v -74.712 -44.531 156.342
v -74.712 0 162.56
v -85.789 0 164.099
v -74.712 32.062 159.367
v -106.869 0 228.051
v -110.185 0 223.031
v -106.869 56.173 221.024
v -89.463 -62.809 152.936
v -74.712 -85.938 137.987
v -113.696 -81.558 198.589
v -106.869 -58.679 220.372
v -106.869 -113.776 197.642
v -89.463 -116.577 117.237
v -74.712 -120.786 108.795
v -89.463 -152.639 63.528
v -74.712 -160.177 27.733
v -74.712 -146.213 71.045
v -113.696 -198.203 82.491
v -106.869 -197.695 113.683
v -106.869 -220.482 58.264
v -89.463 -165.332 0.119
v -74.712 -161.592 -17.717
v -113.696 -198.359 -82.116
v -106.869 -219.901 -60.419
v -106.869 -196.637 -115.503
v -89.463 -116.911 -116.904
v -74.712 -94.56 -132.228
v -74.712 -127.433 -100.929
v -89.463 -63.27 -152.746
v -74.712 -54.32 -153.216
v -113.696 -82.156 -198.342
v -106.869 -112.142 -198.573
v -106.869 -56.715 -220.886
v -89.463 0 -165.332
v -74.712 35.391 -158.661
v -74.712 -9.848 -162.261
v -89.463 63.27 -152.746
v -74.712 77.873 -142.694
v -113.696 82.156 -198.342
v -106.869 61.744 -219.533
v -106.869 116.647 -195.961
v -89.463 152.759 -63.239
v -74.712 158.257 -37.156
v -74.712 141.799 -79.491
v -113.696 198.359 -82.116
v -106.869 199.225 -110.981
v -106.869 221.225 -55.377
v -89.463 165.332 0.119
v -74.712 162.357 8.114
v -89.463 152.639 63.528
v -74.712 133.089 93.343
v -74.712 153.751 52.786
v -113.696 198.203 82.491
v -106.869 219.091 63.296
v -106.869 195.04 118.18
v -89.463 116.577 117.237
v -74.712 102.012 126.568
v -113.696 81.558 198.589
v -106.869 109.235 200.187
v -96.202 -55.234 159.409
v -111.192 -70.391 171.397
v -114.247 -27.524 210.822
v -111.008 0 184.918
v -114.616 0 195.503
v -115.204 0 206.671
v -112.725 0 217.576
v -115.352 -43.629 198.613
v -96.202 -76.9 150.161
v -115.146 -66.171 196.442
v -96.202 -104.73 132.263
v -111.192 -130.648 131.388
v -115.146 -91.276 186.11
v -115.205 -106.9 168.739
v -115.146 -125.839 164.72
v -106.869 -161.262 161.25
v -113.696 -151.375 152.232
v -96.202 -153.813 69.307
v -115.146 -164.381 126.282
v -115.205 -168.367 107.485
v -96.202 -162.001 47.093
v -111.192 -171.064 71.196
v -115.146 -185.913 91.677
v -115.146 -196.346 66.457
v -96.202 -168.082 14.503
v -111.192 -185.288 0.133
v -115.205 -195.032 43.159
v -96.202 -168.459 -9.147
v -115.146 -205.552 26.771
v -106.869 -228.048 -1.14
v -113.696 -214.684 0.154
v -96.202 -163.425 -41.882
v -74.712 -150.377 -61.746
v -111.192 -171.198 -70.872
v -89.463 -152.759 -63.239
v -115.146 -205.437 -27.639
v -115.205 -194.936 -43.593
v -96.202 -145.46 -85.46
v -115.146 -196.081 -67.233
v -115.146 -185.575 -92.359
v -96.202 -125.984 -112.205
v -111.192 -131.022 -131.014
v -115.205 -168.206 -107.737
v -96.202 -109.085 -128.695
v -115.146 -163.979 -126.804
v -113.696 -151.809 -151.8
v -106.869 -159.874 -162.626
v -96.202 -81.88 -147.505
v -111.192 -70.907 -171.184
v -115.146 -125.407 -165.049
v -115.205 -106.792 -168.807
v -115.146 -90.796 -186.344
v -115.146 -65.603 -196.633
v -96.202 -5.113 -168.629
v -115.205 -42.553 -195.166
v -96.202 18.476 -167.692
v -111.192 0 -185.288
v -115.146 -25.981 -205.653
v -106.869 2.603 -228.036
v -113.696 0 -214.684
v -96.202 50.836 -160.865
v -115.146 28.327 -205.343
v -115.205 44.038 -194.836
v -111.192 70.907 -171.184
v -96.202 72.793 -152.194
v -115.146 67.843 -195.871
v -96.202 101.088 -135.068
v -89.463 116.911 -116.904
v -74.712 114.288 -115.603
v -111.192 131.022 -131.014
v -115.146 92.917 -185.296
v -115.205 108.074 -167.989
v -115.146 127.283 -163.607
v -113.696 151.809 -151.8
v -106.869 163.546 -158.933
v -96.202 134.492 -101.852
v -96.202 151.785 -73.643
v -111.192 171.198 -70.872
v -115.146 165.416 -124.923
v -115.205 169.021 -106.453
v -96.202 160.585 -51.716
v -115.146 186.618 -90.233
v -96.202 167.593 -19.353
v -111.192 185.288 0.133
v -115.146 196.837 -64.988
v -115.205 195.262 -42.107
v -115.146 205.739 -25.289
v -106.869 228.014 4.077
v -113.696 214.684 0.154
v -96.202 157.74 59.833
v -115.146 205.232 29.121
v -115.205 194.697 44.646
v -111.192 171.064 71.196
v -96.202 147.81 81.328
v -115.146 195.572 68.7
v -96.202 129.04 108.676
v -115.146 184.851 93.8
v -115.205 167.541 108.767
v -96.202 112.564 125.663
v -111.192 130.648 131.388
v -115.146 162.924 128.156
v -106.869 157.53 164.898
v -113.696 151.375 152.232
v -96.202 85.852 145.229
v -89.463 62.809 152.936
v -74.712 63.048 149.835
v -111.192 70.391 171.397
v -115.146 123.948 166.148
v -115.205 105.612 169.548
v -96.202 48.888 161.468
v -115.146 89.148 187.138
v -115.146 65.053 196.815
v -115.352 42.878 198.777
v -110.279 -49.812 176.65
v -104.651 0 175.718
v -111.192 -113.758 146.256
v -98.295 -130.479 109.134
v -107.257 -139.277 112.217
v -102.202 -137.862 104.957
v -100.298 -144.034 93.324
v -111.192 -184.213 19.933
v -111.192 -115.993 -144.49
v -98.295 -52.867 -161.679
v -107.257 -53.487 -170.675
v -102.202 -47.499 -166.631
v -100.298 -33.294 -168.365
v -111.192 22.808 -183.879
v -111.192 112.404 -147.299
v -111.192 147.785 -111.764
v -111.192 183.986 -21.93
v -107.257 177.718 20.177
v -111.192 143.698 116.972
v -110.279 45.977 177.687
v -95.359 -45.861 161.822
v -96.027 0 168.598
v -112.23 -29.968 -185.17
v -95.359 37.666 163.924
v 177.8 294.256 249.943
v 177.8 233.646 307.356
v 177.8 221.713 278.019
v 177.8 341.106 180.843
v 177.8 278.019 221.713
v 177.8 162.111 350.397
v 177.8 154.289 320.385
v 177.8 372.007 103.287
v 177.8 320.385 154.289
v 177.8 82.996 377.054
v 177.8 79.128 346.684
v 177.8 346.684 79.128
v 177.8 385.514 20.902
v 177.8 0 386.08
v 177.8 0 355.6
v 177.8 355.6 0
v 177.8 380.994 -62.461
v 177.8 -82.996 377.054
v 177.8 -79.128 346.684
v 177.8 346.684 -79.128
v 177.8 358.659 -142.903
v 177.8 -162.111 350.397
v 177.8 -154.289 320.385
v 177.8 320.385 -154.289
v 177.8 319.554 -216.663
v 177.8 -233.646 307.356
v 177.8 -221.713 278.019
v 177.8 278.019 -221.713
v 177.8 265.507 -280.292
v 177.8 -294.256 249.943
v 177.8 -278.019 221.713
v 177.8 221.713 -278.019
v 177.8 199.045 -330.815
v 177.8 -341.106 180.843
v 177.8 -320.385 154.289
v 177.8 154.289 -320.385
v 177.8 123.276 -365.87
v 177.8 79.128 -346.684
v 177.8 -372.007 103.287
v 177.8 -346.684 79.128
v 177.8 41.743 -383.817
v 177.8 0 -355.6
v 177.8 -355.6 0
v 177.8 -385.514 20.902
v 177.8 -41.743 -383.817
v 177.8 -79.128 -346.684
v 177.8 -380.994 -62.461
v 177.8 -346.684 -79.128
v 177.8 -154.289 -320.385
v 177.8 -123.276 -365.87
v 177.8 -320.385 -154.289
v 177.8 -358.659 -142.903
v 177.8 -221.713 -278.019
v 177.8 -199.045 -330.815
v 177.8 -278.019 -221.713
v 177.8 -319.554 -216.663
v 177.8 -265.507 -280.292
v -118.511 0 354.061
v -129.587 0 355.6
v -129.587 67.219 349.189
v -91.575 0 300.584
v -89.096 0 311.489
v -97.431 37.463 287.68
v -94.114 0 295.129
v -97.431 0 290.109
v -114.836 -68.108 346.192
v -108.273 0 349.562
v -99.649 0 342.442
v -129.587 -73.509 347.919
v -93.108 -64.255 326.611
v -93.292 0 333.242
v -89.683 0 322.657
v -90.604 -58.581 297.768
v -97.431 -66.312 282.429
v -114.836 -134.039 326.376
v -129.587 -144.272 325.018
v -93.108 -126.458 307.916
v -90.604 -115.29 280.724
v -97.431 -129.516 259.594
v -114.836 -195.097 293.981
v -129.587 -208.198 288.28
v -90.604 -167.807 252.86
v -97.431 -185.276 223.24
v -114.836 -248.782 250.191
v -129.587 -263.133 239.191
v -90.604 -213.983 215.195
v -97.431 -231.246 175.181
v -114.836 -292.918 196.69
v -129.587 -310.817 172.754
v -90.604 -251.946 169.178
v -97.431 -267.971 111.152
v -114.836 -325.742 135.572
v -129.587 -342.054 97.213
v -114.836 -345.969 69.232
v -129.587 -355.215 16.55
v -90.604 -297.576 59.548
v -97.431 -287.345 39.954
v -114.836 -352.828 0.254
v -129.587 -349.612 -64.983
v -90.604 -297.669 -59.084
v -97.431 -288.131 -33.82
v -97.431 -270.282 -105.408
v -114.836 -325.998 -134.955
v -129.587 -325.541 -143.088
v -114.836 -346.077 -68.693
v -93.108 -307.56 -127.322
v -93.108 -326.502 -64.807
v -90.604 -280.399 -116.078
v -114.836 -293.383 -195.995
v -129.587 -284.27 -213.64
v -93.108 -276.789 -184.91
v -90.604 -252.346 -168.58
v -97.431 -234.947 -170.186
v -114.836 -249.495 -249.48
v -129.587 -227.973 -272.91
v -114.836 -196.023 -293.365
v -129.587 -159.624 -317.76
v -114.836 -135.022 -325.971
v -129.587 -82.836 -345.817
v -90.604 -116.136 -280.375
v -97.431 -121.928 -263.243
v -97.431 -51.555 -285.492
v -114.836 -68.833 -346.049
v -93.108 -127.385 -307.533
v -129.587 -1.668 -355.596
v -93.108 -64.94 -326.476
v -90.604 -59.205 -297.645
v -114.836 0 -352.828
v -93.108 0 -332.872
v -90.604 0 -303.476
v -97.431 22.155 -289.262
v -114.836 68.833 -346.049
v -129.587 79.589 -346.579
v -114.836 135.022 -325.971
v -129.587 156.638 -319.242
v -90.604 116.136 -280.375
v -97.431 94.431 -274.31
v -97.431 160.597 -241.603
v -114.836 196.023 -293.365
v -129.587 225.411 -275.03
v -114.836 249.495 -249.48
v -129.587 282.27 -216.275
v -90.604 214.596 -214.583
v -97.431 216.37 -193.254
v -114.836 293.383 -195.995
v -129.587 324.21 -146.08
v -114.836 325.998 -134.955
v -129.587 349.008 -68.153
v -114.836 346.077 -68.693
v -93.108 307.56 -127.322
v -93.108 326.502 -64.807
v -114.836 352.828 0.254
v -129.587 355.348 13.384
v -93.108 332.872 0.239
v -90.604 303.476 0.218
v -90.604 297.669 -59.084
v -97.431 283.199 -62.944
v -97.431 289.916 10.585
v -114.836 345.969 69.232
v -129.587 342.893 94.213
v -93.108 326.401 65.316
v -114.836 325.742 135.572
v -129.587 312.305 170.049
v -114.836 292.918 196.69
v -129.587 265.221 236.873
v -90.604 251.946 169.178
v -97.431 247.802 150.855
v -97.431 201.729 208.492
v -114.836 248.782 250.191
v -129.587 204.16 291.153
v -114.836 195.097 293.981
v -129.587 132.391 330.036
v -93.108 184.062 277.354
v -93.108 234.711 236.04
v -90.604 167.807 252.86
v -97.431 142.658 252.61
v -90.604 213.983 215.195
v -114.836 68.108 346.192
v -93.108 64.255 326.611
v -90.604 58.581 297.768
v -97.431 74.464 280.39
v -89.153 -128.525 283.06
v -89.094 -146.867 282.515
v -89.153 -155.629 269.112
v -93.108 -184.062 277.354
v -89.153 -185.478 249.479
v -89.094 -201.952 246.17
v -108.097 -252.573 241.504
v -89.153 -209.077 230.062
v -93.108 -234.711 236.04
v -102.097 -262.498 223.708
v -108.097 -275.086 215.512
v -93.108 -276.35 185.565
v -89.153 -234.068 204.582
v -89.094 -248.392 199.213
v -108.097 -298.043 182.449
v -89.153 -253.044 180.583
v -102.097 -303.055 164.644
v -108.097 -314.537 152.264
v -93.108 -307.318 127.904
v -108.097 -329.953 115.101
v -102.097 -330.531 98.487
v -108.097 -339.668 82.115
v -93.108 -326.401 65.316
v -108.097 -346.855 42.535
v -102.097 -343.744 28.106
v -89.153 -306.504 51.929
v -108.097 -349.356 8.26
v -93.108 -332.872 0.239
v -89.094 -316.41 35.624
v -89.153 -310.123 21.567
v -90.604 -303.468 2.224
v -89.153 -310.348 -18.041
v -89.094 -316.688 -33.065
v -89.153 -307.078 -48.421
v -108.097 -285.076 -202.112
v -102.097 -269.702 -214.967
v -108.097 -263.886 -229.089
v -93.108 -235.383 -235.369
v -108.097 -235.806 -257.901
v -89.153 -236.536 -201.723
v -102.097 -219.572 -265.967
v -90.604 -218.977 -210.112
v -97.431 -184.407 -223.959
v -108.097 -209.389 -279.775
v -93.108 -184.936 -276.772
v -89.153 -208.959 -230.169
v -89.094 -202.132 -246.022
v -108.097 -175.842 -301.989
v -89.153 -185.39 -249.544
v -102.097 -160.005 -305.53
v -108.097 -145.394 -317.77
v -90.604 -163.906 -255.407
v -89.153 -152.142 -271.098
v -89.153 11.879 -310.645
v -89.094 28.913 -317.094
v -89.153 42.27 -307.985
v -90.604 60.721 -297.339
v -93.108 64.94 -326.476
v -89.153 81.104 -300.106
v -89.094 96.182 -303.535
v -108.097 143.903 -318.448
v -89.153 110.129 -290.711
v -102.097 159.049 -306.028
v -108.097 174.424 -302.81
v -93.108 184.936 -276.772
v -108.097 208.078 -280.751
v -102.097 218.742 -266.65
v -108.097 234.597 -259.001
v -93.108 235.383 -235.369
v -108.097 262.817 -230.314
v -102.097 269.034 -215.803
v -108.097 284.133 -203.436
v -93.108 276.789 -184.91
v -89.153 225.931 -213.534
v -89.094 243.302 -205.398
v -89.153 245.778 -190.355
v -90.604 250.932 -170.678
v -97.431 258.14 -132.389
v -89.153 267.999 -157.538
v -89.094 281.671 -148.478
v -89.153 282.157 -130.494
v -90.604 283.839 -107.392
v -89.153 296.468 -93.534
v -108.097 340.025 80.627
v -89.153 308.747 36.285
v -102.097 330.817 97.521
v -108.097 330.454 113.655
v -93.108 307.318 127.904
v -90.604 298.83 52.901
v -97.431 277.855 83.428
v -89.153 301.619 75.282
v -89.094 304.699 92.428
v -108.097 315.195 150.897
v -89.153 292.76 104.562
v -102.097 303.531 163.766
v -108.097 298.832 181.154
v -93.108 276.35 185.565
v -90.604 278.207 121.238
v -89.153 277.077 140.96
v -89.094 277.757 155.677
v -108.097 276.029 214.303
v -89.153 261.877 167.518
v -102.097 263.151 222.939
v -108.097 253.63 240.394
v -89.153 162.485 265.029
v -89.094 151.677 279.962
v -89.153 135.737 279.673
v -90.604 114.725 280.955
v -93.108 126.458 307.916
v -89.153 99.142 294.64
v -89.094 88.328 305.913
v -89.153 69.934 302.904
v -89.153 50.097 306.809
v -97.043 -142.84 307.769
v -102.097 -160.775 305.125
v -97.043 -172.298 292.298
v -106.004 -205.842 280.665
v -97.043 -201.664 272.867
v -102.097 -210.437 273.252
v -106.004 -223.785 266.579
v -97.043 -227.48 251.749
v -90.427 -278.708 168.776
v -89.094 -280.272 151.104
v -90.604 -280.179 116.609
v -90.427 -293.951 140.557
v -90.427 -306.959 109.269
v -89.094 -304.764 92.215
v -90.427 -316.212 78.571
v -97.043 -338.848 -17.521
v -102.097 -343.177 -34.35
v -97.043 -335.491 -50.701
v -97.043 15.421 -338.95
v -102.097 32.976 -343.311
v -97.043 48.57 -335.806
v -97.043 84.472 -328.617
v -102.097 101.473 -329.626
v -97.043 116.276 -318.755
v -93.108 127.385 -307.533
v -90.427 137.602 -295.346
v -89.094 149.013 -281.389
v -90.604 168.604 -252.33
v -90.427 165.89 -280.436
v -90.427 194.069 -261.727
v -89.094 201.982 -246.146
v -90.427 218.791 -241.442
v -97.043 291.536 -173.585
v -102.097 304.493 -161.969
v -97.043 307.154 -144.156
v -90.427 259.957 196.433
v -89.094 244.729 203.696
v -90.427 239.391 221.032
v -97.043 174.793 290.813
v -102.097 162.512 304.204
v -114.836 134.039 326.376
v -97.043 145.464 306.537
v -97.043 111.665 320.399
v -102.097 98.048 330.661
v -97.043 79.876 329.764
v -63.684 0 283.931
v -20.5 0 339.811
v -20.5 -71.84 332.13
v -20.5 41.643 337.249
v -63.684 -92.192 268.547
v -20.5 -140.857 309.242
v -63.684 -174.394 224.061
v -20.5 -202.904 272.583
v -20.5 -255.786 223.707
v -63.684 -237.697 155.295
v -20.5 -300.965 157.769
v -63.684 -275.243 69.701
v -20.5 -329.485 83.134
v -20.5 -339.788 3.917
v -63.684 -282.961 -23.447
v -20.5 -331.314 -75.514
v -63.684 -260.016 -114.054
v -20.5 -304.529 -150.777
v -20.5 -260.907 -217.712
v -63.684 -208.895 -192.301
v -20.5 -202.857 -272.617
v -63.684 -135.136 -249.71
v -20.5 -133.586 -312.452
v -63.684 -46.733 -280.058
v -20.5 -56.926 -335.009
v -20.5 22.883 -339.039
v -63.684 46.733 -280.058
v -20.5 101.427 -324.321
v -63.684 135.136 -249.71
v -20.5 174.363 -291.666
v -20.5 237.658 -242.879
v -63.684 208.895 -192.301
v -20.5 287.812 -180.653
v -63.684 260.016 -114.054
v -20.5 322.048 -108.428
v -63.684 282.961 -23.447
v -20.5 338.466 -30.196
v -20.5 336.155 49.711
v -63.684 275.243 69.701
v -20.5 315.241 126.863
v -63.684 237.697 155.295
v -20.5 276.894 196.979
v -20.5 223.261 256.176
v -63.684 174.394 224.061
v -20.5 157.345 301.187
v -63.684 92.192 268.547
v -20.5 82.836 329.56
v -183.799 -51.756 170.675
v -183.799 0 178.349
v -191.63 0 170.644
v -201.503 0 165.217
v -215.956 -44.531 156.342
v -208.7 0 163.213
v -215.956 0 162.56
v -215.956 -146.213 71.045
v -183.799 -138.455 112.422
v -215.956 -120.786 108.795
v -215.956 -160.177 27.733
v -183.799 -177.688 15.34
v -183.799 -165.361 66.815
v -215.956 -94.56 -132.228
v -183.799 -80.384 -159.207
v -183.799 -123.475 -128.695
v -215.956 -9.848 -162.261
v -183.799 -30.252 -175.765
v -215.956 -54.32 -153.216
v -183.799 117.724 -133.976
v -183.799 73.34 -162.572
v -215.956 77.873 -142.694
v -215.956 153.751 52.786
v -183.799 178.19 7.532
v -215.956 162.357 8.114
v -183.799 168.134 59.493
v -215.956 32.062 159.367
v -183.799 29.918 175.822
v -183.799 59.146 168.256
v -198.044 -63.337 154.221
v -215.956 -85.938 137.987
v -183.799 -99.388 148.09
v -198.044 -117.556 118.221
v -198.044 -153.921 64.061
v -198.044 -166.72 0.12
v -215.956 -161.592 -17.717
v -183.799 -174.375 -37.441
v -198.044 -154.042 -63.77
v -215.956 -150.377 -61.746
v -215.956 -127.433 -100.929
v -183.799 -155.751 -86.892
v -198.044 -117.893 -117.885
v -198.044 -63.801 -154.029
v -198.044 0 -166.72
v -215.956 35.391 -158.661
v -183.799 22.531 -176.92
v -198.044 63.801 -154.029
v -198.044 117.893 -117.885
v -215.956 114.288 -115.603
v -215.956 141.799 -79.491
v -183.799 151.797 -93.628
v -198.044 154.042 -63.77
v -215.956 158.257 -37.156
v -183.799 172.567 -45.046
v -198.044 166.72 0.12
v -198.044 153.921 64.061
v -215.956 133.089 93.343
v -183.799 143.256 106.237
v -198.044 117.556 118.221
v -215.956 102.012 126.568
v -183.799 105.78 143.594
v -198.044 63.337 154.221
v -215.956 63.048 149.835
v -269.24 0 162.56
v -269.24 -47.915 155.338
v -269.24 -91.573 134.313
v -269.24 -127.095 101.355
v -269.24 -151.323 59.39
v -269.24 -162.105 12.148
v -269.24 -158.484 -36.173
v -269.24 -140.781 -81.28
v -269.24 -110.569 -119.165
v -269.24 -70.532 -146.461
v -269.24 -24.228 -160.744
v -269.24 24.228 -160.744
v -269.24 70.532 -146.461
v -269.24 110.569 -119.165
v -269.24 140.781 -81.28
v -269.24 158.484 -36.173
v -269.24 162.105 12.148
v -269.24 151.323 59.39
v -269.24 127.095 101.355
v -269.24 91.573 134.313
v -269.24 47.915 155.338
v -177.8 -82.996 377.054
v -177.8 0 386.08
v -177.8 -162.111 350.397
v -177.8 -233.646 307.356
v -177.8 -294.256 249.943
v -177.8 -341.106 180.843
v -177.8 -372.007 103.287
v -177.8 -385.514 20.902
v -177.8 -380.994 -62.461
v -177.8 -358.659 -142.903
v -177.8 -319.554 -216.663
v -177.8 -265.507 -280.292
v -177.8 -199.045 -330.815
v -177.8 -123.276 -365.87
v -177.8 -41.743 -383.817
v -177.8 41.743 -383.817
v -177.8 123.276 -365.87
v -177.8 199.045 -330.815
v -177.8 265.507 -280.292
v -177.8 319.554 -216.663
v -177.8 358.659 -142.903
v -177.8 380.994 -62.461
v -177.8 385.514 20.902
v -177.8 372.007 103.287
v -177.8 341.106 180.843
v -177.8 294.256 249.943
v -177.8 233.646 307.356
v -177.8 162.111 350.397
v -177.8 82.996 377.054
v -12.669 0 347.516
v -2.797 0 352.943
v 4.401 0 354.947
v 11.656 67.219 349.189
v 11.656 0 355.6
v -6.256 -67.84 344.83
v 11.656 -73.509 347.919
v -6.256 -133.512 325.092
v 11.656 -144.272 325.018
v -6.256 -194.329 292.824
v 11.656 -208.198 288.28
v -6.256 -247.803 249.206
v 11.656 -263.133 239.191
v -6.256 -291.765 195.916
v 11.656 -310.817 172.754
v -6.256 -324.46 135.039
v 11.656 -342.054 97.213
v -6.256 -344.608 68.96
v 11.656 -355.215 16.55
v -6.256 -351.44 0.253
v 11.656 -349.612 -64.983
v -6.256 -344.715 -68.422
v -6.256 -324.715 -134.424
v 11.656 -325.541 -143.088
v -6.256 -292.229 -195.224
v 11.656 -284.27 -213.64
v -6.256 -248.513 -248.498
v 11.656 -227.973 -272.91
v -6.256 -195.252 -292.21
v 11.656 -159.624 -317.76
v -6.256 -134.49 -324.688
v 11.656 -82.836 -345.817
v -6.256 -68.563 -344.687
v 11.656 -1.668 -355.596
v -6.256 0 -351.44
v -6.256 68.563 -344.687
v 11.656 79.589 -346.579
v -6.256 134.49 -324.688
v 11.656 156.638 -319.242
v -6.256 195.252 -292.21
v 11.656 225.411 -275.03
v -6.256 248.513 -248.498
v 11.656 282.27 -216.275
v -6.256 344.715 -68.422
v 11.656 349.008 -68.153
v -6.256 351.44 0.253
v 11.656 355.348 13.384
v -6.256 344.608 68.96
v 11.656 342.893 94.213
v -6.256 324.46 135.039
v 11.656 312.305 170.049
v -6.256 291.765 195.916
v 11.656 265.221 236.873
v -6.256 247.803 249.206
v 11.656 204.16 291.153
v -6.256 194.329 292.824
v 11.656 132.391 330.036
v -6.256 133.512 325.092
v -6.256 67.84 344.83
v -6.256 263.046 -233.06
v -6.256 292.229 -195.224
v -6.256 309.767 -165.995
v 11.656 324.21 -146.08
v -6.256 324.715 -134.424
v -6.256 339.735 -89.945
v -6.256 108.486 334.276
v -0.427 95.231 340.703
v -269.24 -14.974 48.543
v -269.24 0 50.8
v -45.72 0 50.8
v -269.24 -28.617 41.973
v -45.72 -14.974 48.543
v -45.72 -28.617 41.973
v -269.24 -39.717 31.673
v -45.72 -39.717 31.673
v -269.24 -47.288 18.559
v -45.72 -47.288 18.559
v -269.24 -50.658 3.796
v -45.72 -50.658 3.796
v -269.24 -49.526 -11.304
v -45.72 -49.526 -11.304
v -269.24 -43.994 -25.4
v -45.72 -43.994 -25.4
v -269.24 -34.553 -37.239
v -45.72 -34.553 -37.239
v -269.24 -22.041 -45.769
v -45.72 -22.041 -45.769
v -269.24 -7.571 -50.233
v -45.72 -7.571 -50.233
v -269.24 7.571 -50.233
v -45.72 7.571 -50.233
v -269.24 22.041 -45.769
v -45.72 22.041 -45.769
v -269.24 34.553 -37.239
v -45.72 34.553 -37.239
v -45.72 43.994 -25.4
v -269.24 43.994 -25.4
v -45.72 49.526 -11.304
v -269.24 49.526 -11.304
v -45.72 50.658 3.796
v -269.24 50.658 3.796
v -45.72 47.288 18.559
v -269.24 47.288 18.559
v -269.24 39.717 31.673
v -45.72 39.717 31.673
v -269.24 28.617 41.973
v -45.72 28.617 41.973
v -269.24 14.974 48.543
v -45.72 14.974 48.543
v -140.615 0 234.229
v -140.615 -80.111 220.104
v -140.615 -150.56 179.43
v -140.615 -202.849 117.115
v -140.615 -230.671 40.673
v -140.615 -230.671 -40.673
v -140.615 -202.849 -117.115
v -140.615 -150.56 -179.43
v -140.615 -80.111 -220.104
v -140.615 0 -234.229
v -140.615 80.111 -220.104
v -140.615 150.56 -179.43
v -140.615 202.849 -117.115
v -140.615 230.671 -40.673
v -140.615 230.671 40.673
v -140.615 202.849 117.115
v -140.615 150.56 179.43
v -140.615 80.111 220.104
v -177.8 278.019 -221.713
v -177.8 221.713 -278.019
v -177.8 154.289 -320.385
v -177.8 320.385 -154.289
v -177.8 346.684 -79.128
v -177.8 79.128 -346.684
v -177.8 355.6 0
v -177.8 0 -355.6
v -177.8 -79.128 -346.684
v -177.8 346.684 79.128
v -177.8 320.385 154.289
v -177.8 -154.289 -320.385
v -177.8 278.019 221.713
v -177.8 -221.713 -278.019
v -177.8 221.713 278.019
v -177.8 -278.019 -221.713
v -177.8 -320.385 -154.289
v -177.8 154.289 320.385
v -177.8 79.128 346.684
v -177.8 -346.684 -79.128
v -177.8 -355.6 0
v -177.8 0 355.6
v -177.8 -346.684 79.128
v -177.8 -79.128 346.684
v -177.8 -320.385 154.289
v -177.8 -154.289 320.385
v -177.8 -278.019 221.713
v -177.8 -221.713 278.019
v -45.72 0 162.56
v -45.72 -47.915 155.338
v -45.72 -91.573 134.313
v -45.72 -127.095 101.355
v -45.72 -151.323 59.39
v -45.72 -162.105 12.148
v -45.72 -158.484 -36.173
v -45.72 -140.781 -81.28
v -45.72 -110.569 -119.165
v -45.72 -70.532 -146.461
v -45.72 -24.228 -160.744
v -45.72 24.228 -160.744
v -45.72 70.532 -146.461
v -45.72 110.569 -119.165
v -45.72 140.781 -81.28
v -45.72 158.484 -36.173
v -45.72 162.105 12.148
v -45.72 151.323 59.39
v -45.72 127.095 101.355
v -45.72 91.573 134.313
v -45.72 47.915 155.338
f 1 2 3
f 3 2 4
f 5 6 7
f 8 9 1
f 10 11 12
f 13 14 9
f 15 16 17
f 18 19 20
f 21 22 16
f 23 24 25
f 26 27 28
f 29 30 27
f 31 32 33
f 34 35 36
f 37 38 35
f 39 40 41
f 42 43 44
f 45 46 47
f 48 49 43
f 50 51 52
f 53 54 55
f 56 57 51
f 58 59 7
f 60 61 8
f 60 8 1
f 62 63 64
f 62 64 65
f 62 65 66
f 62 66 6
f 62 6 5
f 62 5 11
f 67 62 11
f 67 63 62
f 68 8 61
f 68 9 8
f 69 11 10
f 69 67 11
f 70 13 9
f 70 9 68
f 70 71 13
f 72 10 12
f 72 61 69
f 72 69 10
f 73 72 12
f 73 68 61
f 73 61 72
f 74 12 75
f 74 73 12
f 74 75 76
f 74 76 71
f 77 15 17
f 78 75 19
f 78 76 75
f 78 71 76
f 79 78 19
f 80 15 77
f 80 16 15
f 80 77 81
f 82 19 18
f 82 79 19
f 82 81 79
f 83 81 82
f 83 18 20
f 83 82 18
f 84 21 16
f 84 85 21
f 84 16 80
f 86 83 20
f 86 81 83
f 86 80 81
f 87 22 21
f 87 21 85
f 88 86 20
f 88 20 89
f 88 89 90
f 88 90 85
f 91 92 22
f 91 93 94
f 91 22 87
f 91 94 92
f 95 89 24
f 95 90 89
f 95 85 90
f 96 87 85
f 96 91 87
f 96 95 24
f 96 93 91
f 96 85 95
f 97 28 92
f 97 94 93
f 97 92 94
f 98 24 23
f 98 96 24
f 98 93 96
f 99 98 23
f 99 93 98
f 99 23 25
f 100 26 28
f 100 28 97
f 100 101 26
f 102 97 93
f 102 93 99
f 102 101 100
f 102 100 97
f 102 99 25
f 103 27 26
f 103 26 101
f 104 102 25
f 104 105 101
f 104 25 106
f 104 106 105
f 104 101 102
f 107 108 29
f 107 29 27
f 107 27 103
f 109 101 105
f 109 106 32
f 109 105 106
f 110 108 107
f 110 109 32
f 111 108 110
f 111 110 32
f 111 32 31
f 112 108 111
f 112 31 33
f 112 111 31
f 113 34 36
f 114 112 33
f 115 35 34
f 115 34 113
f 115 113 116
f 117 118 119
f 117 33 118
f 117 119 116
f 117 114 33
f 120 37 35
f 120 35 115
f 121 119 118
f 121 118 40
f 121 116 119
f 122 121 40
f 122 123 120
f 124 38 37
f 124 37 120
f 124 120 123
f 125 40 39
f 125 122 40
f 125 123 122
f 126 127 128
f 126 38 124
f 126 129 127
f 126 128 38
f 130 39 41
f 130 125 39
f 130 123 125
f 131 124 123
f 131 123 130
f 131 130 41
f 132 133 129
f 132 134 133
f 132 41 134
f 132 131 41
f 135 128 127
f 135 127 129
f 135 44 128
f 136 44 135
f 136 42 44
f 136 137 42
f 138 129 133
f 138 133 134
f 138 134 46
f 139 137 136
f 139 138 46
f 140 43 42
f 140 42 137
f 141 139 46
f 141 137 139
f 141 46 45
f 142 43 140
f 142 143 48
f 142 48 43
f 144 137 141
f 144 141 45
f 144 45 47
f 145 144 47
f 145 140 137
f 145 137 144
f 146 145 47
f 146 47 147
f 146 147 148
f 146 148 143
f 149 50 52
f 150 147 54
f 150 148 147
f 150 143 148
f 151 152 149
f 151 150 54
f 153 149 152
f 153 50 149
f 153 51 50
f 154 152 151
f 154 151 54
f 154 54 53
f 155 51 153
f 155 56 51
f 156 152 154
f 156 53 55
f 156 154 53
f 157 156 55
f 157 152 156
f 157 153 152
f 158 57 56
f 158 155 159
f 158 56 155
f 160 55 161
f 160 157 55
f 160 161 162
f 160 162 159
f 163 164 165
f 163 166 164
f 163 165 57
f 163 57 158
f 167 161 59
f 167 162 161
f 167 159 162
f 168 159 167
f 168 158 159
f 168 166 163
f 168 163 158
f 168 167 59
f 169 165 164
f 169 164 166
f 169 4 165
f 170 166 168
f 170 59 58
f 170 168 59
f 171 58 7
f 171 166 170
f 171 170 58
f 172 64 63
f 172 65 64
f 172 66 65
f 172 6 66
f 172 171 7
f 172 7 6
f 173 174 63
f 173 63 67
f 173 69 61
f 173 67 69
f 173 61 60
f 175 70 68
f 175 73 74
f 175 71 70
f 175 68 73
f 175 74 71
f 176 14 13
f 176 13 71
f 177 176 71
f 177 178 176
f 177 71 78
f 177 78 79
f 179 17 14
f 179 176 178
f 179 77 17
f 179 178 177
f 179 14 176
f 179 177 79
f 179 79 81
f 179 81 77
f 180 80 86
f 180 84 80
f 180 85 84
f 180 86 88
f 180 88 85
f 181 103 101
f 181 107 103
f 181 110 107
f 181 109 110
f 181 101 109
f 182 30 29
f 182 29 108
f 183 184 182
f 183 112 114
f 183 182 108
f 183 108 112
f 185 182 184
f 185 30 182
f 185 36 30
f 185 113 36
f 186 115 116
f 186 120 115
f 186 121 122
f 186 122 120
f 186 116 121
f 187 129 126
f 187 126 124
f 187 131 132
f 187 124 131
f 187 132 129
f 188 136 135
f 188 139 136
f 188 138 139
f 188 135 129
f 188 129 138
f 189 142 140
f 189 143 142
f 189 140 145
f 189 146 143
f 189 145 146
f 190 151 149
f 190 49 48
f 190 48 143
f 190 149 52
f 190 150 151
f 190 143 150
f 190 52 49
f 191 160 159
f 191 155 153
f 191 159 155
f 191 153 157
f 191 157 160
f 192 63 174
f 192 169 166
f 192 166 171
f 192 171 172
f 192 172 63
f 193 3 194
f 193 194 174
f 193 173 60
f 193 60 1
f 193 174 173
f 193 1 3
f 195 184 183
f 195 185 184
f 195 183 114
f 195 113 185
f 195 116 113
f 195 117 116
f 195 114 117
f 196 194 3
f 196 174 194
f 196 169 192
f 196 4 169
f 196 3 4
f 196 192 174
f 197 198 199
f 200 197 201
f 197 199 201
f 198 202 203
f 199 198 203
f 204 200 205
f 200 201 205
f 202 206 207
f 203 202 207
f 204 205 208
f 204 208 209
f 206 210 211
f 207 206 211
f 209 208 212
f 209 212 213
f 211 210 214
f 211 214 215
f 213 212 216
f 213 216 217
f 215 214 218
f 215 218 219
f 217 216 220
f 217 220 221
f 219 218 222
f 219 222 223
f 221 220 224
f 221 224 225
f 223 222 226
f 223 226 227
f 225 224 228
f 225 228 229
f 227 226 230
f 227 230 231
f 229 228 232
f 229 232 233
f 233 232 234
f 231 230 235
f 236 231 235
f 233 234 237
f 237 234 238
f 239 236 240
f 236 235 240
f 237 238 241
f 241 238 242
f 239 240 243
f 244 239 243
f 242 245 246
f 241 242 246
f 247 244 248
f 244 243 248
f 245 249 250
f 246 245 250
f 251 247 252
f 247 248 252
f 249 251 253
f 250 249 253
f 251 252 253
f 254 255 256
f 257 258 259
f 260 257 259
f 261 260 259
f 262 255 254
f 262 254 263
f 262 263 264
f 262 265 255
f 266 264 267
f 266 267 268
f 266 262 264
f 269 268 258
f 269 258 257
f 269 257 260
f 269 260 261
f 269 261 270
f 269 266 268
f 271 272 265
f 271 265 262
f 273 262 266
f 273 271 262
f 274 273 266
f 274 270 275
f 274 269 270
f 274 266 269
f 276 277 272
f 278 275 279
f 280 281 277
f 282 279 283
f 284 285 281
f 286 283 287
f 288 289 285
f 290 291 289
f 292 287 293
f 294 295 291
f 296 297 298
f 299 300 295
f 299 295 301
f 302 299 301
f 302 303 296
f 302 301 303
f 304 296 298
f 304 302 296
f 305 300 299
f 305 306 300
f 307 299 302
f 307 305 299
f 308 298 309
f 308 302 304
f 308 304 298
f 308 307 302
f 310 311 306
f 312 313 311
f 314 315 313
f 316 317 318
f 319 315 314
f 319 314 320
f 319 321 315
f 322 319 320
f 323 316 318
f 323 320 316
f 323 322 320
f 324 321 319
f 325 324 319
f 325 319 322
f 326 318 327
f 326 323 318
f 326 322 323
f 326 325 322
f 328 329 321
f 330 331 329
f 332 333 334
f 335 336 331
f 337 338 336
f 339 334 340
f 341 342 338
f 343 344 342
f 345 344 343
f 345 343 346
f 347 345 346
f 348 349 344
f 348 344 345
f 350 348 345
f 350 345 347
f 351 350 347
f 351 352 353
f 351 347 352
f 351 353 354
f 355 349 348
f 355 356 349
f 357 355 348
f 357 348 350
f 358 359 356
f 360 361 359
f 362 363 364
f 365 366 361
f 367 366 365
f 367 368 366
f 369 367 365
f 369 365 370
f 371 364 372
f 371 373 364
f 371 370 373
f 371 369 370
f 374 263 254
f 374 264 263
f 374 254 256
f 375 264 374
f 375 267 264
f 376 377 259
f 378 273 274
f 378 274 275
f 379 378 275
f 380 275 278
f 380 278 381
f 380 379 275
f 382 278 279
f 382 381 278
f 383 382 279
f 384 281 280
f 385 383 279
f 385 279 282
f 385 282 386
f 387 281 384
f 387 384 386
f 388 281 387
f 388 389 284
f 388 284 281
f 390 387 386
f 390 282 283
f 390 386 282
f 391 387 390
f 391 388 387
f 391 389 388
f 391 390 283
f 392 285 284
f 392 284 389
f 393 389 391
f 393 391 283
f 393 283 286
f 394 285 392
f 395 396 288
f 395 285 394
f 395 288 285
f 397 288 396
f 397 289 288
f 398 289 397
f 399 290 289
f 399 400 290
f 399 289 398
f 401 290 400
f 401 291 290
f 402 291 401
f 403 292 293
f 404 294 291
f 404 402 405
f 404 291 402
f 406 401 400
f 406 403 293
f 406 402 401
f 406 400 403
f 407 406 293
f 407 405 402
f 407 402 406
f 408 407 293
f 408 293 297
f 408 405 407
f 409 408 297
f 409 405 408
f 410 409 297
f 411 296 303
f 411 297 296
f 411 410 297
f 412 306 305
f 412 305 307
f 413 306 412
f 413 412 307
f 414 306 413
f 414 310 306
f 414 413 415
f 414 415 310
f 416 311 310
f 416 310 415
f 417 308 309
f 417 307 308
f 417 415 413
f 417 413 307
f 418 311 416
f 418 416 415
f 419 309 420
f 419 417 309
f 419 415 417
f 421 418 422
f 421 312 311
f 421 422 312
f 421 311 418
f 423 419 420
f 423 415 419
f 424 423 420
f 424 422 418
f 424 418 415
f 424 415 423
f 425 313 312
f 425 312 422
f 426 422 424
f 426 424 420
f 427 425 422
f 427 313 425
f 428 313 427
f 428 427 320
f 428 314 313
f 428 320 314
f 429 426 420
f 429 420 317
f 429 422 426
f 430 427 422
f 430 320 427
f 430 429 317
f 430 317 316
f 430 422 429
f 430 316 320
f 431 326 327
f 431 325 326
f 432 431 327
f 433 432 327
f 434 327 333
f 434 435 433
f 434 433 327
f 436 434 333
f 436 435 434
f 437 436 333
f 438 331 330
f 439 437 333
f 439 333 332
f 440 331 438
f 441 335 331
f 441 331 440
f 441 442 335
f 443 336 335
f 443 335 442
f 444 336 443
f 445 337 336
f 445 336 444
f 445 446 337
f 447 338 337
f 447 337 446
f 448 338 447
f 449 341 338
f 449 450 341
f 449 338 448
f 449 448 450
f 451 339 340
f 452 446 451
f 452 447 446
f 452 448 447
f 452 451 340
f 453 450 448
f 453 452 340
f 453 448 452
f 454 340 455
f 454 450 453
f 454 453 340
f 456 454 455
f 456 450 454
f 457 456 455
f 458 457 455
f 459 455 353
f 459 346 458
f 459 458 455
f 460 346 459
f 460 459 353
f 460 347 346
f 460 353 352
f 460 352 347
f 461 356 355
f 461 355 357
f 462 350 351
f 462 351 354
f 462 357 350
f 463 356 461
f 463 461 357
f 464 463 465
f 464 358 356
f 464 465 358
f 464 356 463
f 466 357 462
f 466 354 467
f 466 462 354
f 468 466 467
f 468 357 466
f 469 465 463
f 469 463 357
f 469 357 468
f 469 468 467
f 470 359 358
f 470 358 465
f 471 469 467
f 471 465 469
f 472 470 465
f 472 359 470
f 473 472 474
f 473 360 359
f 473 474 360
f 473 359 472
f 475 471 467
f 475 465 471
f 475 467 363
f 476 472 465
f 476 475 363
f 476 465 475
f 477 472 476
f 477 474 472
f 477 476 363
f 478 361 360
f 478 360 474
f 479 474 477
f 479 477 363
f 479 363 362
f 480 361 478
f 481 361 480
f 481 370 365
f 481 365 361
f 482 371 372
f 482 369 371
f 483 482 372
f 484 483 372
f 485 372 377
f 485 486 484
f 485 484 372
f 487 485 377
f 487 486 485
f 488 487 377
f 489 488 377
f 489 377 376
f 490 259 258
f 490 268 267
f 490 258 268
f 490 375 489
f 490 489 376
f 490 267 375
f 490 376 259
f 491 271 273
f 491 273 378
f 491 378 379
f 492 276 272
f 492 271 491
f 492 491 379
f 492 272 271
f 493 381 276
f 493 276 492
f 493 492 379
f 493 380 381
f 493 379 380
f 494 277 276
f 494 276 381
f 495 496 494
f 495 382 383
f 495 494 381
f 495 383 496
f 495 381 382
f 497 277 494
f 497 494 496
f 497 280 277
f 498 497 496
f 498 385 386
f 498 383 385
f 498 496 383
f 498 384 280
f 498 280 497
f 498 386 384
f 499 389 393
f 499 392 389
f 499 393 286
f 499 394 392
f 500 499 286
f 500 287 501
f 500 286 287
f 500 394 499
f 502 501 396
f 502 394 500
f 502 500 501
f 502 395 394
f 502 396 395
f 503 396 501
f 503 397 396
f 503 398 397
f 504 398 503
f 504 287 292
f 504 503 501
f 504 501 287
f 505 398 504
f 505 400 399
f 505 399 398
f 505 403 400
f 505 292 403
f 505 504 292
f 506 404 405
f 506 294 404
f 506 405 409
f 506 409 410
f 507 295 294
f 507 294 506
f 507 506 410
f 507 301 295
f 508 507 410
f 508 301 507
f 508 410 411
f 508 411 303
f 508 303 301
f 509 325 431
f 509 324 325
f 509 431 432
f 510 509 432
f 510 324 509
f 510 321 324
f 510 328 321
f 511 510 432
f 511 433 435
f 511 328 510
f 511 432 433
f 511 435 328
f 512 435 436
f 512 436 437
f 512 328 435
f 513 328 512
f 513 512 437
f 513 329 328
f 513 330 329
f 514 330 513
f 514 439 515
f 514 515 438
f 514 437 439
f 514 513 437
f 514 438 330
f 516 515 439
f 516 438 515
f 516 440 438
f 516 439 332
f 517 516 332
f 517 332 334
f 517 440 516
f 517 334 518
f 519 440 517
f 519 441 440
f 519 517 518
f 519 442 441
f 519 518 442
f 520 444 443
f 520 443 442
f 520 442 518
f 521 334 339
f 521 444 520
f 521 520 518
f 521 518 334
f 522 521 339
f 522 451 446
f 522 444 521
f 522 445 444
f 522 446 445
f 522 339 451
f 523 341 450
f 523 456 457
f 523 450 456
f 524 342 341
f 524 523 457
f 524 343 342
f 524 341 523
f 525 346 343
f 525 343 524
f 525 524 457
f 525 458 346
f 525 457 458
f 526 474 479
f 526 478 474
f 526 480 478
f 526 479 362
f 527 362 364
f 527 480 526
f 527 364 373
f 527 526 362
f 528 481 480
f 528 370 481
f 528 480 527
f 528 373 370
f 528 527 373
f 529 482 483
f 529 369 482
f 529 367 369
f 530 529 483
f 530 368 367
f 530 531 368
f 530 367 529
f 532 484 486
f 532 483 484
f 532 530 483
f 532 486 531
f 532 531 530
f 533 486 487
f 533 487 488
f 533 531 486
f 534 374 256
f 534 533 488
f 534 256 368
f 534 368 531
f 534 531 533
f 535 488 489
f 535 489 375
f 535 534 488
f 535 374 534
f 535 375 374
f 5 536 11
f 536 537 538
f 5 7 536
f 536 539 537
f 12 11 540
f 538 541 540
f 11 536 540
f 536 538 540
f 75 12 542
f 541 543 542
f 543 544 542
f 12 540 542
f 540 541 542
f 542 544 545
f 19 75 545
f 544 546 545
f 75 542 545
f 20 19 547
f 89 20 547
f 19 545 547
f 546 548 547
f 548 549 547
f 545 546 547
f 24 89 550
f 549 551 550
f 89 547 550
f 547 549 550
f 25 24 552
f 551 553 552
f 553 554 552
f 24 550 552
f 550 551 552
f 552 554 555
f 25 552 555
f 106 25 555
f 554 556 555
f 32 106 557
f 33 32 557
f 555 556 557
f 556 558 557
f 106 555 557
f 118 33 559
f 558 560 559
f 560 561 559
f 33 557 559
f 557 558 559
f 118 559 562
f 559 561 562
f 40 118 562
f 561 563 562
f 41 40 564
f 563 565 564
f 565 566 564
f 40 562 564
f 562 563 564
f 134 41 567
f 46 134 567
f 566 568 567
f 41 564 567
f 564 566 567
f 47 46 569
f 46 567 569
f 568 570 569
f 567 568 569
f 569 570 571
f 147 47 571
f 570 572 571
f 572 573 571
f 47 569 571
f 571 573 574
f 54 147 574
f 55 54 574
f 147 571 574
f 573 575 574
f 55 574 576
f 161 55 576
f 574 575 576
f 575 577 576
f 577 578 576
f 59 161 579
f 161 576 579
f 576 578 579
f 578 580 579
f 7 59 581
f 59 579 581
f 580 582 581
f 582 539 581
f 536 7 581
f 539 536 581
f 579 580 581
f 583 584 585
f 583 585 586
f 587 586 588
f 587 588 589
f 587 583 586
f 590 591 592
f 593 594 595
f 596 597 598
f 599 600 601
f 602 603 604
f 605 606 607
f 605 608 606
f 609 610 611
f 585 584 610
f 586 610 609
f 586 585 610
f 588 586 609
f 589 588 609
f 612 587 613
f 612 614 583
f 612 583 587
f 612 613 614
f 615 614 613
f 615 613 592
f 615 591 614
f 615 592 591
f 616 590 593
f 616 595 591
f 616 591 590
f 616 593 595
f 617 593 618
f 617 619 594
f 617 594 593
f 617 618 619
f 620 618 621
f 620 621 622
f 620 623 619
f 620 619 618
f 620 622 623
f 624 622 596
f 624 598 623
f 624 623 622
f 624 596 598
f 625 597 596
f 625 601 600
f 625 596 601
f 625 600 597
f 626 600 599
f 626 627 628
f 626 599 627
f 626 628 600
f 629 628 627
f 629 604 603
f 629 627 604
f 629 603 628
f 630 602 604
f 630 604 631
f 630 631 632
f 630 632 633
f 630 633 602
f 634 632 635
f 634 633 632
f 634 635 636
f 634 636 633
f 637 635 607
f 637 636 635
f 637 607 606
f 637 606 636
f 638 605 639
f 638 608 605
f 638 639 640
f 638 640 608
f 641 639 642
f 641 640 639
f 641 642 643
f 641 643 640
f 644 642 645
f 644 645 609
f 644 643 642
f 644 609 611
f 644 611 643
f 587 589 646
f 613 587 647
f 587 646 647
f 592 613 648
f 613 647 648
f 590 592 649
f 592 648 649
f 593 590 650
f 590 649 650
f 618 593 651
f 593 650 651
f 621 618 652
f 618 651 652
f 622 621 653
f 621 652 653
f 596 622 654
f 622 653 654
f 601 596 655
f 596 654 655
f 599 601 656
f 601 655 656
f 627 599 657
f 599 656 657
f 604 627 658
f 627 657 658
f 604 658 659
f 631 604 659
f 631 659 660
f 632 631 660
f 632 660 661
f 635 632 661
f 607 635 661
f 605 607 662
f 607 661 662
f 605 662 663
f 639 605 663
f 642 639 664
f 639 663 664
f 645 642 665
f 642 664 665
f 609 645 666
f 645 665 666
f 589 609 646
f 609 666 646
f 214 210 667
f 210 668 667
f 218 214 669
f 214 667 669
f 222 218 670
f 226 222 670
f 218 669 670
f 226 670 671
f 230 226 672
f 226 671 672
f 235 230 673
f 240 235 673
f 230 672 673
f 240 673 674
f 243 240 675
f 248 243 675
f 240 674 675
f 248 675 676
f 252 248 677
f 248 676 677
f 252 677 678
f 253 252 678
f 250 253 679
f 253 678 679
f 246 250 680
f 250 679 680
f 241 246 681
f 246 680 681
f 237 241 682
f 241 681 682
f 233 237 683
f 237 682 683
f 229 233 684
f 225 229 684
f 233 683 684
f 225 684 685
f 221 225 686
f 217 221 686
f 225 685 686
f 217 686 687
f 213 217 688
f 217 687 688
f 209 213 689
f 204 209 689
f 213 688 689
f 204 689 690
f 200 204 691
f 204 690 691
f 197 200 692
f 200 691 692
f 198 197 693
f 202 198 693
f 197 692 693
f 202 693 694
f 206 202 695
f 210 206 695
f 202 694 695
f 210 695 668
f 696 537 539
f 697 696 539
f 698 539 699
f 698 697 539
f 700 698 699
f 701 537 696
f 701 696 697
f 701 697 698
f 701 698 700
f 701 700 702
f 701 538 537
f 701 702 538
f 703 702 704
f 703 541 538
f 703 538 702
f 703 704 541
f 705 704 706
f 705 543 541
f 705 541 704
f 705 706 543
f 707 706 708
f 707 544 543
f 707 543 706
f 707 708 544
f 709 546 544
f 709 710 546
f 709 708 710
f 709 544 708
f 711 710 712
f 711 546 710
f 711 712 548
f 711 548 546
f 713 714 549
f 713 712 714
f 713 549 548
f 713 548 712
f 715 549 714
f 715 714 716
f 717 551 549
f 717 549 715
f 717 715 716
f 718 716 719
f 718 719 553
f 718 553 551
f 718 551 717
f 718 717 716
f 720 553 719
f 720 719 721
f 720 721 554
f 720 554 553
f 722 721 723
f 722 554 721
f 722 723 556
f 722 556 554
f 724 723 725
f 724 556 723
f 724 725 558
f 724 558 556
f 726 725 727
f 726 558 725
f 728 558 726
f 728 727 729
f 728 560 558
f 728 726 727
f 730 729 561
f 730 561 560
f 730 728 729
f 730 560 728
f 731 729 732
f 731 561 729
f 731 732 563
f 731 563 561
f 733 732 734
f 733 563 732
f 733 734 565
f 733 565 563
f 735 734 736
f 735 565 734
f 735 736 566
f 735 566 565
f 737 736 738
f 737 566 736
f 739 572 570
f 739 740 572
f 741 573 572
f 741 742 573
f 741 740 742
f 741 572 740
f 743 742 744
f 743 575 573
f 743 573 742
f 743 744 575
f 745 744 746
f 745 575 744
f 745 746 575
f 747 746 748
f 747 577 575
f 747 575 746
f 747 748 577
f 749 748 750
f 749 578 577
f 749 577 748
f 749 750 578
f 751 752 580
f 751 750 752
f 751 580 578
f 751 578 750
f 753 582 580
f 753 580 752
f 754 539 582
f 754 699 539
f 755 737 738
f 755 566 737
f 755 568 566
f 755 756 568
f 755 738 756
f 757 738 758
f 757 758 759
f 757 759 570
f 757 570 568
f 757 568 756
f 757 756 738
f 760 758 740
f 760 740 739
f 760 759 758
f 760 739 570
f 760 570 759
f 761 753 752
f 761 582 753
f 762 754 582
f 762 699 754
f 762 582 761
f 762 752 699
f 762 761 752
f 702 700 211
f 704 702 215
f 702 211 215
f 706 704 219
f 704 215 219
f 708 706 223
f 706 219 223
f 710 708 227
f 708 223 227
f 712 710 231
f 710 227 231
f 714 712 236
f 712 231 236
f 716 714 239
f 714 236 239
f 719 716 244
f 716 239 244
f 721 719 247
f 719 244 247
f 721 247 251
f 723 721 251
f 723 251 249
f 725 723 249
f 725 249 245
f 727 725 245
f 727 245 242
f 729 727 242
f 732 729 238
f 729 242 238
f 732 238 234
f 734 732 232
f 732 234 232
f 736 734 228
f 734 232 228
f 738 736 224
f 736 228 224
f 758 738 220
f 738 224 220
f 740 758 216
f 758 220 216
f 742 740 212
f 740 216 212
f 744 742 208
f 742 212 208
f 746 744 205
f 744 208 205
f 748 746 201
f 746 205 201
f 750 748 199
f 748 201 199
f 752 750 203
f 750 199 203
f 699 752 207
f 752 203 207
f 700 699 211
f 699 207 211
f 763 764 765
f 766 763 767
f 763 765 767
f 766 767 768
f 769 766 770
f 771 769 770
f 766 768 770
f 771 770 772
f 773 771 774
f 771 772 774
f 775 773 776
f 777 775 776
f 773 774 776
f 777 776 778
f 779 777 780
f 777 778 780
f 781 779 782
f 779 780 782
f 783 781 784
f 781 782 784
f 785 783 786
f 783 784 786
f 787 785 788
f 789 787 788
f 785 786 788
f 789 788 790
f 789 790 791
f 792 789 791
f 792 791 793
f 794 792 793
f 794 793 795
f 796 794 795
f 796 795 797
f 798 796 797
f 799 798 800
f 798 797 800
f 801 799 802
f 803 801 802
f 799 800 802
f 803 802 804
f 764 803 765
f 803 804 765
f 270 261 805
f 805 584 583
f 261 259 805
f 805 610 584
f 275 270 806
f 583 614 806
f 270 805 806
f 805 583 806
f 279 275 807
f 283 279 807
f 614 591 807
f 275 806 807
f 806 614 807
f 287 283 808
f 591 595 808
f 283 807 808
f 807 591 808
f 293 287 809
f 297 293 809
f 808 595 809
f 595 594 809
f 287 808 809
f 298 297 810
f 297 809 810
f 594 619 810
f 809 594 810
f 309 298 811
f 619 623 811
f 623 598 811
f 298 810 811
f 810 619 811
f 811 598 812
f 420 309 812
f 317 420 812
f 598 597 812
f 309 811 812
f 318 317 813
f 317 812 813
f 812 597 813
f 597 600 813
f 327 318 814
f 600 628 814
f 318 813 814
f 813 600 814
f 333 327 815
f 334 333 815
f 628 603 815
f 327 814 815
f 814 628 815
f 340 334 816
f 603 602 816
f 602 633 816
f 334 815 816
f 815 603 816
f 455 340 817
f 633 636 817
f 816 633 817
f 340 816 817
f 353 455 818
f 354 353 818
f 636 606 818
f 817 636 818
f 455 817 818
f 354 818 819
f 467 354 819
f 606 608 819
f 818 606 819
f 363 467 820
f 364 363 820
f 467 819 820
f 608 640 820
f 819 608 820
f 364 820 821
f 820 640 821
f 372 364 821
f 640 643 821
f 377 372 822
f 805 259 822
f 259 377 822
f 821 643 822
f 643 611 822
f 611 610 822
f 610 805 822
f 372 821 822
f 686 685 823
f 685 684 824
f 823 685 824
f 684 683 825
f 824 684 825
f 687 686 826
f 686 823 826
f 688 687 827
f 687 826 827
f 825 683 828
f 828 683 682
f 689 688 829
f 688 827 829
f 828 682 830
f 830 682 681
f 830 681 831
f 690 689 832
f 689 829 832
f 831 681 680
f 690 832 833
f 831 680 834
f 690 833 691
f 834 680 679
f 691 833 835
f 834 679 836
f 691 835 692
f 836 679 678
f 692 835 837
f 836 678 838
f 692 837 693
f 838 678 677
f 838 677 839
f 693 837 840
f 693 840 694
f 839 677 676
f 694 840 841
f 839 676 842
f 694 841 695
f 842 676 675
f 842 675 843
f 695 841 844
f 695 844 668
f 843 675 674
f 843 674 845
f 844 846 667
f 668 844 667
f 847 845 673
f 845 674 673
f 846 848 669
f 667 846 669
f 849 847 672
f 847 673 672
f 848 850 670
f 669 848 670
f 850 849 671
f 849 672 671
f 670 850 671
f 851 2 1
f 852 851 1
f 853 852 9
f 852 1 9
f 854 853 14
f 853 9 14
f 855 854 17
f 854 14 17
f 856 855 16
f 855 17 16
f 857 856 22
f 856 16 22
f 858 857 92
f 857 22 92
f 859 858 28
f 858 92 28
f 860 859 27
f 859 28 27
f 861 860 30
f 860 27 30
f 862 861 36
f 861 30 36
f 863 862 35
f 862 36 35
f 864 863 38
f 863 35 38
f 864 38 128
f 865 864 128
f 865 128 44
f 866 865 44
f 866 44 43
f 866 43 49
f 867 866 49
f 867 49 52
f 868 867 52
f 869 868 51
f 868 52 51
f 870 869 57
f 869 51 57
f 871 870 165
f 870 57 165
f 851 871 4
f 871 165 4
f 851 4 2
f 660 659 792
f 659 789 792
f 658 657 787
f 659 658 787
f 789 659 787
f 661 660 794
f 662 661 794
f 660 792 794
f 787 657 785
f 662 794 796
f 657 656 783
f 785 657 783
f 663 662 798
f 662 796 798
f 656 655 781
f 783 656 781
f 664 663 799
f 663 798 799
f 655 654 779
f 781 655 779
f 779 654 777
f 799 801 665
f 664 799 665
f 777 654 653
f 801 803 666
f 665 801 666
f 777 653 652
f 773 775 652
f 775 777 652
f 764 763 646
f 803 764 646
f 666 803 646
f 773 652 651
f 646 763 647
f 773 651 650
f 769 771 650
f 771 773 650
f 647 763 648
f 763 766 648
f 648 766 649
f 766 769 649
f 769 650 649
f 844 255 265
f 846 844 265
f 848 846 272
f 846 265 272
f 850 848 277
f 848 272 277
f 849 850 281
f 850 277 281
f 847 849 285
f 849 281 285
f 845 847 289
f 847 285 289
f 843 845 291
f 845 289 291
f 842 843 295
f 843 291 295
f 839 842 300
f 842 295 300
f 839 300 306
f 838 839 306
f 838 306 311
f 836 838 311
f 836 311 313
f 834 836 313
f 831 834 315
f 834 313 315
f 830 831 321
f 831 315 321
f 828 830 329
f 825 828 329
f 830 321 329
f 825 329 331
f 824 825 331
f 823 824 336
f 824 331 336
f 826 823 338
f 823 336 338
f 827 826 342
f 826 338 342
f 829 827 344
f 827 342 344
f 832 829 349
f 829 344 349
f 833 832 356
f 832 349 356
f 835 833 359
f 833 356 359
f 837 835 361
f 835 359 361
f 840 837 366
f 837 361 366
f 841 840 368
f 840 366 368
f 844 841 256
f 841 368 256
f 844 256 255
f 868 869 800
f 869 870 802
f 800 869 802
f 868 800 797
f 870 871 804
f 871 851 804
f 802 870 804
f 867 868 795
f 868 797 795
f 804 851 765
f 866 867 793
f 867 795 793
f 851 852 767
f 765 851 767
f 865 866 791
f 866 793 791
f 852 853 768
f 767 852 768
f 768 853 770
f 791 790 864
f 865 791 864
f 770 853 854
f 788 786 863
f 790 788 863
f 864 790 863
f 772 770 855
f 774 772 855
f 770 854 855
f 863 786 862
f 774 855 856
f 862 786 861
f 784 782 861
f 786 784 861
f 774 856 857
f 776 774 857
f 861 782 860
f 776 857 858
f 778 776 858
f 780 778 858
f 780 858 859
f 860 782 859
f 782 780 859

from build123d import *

# Parameters (mm, degrees)
F2_R     = 25.4
F3_SCALE = 1.6


with BuildPart() as f1:
    # F0 (on Front) → F1 (revolve)
    with BuildSketch(Plane.XZ):
        Polygon((111.125, 222.25), (111.125, 241.3), (-111.125, 241.3), (-111.125, 222.25), (-29.2621003771, 222.25), (-5.1864683628, 222.25), align=None)
        Polygon((-98.425, 101.6), (-5.1864683628, 222.25), (-29.2621003771, 222.25), (-122.5006320143, 101.6), align=None)
        Polygon((-28.575, 101.6), (-98.425, 101.6), (-122.5006320143, 101.6), (-168.275, 101.6), (-168.275, 31.75), (-28.575, 31.75), align=None)
    revolve(axis=Axis((-5.1864683628, 0, 0), (1, 0, 0)))

    # F2
    f2_edges = [f1.edges().sort_by_distance(p)[0] for p in [
        (-98.425, 0, -101.6),
        (-5.186468, 0, -222.25),
        (-51.805734, 0, 161.925),
        (-29.2621, 0, -222.25),
        (-122.500632, 0, -101.6),
        (-75.881366, 0, 161.925),
    ]]
    fillet(f2_edges, radius=F2_R)


with BuildPart() as f1_1:
    # F3: moved
    add(f1.part.scale(F3_SCALE))


solid = f1_1.part
